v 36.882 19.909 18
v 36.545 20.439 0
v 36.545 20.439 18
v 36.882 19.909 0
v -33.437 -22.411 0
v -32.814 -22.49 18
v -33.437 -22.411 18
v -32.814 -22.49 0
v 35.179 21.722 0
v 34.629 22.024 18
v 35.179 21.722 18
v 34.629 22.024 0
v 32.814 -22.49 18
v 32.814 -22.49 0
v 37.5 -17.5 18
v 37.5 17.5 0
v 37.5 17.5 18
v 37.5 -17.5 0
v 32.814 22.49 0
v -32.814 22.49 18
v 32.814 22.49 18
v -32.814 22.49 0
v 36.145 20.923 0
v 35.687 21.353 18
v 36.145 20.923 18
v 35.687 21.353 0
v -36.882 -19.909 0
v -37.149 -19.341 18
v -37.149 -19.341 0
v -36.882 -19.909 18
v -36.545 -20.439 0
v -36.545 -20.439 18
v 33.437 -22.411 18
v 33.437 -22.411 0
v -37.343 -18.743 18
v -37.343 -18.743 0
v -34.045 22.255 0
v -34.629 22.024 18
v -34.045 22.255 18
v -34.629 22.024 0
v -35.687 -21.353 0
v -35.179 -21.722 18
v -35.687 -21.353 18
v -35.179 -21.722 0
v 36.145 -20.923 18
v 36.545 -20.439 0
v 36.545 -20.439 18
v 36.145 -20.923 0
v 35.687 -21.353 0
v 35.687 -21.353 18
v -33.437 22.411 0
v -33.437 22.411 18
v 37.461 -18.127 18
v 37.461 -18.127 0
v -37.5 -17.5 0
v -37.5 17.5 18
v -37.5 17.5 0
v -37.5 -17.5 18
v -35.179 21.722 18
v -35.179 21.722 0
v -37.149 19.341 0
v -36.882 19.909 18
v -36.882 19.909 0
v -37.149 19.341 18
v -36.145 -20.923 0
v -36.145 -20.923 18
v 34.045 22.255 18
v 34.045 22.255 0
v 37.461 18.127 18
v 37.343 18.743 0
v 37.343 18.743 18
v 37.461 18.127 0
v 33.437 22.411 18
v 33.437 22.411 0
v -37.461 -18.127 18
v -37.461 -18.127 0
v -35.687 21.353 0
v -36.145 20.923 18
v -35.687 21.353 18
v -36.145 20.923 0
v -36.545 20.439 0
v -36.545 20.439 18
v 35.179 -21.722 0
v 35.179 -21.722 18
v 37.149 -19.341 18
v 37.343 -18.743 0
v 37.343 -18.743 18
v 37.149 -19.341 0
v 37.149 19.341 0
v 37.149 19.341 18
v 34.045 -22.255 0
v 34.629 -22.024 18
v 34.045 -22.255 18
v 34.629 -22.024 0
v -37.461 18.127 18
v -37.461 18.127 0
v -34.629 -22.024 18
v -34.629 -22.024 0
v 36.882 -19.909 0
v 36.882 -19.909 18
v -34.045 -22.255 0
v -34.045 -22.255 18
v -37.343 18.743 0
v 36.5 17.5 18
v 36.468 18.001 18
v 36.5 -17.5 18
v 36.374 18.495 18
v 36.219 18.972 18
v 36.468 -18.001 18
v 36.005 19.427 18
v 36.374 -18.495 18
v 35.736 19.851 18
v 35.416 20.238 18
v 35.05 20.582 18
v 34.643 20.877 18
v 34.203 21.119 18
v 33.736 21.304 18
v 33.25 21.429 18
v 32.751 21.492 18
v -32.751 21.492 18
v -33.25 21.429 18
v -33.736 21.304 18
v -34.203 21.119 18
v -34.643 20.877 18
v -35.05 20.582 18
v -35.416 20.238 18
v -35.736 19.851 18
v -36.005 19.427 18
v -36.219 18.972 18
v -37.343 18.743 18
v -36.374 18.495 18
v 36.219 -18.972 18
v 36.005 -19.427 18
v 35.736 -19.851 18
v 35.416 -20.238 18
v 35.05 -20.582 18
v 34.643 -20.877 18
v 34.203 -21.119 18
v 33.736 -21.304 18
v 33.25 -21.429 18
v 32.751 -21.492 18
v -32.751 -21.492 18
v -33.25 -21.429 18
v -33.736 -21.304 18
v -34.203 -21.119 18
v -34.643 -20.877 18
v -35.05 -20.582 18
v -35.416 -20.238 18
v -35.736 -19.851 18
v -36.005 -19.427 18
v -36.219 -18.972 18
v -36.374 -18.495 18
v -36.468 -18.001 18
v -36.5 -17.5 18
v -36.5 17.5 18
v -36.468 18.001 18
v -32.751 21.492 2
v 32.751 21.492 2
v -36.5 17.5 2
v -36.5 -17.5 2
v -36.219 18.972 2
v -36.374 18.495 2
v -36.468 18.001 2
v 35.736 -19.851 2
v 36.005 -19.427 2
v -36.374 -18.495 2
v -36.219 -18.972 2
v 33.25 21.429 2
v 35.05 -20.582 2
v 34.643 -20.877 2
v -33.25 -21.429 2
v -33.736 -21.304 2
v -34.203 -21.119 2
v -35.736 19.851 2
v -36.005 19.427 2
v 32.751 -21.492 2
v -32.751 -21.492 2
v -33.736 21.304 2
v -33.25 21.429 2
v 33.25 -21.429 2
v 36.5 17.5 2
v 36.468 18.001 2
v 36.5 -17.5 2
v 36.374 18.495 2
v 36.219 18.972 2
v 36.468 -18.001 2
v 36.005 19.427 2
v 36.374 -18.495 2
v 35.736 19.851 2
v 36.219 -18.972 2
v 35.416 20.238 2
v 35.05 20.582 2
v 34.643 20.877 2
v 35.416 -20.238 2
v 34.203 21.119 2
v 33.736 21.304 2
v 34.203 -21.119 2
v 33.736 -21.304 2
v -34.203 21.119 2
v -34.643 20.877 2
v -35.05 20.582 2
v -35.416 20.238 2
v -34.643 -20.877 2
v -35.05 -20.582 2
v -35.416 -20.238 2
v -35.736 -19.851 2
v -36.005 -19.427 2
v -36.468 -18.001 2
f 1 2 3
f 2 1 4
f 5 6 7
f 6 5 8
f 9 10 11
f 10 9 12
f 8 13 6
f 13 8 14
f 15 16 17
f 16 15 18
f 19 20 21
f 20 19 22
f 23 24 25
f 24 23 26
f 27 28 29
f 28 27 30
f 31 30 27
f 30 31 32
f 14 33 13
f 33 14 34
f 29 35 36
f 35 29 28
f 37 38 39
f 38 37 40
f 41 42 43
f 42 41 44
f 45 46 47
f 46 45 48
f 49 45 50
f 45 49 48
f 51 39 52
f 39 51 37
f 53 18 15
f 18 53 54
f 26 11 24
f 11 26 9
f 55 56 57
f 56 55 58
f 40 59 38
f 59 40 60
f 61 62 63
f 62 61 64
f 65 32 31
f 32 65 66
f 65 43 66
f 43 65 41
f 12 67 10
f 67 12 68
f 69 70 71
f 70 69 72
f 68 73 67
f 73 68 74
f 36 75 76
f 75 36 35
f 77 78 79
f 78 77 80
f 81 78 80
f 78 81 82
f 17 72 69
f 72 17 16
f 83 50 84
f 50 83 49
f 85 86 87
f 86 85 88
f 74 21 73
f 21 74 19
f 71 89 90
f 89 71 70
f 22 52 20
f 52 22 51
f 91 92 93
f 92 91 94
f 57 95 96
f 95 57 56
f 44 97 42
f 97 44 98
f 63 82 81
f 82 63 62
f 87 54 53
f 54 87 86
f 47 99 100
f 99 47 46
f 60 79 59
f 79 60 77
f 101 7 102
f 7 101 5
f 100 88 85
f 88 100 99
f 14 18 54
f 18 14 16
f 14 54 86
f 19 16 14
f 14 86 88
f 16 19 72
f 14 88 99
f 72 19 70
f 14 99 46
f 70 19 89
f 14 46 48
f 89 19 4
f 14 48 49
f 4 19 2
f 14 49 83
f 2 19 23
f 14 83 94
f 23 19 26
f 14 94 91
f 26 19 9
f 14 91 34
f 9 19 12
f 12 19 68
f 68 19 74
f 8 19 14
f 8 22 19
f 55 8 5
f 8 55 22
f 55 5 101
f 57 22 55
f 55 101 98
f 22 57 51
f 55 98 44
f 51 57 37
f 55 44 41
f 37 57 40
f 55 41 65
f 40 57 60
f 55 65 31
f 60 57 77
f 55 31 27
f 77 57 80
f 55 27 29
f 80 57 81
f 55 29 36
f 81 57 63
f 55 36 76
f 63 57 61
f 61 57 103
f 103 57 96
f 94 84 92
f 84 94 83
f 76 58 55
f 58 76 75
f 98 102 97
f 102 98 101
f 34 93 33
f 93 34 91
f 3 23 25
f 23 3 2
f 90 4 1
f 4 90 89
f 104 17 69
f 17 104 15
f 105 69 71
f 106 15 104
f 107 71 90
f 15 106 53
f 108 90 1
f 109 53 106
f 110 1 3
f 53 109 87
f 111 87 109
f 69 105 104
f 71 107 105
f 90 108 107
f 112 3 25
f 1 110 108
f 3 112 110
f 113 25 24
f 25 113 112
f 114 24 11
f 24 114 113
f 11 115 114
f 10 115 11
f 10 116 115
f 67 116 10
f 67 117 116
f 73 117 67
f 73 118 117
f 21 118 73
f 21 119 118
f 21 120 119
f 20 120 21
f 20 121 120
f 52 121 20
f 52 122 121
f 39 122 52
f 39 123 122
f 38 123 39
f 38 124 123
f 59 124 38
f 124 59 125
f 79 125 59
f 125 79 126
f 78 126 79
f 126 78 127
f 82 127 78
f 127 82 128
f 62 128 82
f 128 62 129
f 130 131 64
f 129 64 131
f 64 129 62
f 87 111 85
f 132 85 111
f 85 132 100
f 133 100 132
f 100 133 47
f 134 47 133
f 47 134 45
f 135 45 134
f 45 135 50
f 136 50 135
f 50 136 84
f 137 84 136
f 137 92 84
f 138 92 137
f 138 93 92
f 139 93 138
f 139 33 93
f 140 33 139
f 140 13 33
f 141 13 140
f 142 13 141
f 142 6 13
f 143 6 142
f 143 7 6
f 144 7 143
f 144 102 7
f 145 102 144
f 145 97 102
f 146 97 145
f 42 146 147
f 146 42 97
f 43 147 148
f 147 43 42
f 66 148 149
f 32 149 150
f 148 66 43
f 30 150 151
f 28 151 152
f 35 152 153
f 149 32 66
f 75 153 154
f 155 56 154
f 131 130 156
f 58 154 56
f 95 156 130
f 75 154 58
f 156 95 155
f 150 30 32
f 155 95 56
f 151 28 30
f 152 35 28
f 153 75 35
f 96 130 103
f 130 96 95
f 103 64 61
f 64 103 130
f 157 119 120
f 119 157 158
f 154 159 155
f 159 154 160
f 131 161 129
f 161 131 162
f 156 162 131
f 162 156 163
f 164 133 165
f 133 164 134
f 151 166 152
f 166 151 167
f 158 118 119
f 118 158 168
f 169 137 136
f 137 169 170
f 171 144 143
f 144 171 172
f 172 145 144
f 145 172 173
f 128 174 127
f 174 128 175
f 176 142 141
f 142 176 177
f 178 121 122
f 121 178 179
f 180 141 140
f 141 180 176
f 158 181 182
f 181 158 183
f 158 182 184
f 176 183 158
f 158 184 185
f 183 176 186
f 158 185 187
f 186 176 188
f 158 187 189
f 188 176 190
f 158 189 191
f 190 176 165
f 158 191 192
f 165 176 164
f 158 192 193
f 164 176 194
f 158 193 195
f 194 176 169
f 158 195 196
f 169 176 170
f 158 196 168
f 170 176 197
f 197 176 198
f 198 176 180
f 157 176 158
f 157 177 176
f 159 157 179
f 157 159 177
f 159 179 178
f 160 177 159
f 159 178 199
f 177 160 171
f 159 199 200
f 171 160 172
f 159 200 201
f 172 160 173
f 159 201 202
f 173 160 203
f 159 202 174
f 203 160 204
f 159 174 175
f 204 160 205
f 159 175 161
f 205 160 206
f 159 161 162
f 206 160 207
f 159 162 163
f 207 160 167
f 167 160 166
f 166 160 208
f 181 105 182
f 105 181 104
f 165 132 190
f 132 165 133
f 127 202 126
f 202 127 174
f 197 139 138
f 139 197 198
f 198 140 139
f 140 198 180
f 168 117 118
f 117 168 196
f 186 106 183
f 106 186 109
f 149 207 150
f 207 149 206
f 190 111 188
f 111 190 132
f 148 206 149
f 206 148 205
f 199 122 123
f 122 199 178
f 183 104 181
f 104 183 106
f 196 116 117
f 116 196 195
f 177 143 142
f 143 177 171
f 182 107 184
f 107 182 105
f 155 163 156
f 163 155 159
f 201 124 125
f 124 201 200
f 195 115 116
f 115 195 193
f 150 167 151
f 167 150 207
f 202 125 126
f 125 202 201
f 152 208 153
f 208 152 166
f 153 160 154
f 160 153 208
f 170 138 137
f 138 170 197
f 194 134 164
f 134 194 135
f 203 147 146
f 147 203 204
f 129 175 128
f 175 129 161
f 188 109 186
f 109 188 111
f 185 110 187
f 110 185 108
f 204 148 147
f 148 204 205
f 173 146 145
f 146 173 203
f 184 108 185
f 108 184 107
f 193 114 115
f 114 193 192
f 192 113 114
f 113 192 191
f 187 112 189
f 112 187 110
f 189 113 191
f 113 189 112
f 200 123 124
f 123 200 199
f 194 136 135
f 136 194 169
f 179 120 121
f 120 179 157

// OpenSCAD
$fn = 50;


difference() {
	union() {
		hull() {
			translate(v = [-32.5000000000, 17.5000000000, 0]) {
				cylinder(h = 18, r = 5);
			}
			translate(v = [32.5000000000, 17.5000000000, 0]) {
				cylinder(h = 18, r = 5);
			}
			translate(v = [-32.5000000000, -17.5000000000, 0]) {
				cylinder(h = 18, r = 5);
			}
			translate(v = [32.5000000000, -17.5000000000, 0]) {
				cylinder(h = 18, r = 5);
			}
		}
	}
	union() {
		translate(v = [0, 0, 2]) {
			hull() {
				translate(v = [-32.5000000000, 17.5000000000, 0]) {
					cylinder(h = 16, r = 4);
				}
				translate(v = [32.5000000000, 17.5000000000, 0]) {
					cylinder(h = 16, r = 4);
				}
				translate(v = [-32.5000000000, -17.5000000000, 0]) {
					cylinder(h = 16, r = 4);
				}
				translate(v = [32.5000000000, -17.5000000000, 0]) {
					cylinder(h = 16, r = 4);
				}
			}
		}
	}
}
